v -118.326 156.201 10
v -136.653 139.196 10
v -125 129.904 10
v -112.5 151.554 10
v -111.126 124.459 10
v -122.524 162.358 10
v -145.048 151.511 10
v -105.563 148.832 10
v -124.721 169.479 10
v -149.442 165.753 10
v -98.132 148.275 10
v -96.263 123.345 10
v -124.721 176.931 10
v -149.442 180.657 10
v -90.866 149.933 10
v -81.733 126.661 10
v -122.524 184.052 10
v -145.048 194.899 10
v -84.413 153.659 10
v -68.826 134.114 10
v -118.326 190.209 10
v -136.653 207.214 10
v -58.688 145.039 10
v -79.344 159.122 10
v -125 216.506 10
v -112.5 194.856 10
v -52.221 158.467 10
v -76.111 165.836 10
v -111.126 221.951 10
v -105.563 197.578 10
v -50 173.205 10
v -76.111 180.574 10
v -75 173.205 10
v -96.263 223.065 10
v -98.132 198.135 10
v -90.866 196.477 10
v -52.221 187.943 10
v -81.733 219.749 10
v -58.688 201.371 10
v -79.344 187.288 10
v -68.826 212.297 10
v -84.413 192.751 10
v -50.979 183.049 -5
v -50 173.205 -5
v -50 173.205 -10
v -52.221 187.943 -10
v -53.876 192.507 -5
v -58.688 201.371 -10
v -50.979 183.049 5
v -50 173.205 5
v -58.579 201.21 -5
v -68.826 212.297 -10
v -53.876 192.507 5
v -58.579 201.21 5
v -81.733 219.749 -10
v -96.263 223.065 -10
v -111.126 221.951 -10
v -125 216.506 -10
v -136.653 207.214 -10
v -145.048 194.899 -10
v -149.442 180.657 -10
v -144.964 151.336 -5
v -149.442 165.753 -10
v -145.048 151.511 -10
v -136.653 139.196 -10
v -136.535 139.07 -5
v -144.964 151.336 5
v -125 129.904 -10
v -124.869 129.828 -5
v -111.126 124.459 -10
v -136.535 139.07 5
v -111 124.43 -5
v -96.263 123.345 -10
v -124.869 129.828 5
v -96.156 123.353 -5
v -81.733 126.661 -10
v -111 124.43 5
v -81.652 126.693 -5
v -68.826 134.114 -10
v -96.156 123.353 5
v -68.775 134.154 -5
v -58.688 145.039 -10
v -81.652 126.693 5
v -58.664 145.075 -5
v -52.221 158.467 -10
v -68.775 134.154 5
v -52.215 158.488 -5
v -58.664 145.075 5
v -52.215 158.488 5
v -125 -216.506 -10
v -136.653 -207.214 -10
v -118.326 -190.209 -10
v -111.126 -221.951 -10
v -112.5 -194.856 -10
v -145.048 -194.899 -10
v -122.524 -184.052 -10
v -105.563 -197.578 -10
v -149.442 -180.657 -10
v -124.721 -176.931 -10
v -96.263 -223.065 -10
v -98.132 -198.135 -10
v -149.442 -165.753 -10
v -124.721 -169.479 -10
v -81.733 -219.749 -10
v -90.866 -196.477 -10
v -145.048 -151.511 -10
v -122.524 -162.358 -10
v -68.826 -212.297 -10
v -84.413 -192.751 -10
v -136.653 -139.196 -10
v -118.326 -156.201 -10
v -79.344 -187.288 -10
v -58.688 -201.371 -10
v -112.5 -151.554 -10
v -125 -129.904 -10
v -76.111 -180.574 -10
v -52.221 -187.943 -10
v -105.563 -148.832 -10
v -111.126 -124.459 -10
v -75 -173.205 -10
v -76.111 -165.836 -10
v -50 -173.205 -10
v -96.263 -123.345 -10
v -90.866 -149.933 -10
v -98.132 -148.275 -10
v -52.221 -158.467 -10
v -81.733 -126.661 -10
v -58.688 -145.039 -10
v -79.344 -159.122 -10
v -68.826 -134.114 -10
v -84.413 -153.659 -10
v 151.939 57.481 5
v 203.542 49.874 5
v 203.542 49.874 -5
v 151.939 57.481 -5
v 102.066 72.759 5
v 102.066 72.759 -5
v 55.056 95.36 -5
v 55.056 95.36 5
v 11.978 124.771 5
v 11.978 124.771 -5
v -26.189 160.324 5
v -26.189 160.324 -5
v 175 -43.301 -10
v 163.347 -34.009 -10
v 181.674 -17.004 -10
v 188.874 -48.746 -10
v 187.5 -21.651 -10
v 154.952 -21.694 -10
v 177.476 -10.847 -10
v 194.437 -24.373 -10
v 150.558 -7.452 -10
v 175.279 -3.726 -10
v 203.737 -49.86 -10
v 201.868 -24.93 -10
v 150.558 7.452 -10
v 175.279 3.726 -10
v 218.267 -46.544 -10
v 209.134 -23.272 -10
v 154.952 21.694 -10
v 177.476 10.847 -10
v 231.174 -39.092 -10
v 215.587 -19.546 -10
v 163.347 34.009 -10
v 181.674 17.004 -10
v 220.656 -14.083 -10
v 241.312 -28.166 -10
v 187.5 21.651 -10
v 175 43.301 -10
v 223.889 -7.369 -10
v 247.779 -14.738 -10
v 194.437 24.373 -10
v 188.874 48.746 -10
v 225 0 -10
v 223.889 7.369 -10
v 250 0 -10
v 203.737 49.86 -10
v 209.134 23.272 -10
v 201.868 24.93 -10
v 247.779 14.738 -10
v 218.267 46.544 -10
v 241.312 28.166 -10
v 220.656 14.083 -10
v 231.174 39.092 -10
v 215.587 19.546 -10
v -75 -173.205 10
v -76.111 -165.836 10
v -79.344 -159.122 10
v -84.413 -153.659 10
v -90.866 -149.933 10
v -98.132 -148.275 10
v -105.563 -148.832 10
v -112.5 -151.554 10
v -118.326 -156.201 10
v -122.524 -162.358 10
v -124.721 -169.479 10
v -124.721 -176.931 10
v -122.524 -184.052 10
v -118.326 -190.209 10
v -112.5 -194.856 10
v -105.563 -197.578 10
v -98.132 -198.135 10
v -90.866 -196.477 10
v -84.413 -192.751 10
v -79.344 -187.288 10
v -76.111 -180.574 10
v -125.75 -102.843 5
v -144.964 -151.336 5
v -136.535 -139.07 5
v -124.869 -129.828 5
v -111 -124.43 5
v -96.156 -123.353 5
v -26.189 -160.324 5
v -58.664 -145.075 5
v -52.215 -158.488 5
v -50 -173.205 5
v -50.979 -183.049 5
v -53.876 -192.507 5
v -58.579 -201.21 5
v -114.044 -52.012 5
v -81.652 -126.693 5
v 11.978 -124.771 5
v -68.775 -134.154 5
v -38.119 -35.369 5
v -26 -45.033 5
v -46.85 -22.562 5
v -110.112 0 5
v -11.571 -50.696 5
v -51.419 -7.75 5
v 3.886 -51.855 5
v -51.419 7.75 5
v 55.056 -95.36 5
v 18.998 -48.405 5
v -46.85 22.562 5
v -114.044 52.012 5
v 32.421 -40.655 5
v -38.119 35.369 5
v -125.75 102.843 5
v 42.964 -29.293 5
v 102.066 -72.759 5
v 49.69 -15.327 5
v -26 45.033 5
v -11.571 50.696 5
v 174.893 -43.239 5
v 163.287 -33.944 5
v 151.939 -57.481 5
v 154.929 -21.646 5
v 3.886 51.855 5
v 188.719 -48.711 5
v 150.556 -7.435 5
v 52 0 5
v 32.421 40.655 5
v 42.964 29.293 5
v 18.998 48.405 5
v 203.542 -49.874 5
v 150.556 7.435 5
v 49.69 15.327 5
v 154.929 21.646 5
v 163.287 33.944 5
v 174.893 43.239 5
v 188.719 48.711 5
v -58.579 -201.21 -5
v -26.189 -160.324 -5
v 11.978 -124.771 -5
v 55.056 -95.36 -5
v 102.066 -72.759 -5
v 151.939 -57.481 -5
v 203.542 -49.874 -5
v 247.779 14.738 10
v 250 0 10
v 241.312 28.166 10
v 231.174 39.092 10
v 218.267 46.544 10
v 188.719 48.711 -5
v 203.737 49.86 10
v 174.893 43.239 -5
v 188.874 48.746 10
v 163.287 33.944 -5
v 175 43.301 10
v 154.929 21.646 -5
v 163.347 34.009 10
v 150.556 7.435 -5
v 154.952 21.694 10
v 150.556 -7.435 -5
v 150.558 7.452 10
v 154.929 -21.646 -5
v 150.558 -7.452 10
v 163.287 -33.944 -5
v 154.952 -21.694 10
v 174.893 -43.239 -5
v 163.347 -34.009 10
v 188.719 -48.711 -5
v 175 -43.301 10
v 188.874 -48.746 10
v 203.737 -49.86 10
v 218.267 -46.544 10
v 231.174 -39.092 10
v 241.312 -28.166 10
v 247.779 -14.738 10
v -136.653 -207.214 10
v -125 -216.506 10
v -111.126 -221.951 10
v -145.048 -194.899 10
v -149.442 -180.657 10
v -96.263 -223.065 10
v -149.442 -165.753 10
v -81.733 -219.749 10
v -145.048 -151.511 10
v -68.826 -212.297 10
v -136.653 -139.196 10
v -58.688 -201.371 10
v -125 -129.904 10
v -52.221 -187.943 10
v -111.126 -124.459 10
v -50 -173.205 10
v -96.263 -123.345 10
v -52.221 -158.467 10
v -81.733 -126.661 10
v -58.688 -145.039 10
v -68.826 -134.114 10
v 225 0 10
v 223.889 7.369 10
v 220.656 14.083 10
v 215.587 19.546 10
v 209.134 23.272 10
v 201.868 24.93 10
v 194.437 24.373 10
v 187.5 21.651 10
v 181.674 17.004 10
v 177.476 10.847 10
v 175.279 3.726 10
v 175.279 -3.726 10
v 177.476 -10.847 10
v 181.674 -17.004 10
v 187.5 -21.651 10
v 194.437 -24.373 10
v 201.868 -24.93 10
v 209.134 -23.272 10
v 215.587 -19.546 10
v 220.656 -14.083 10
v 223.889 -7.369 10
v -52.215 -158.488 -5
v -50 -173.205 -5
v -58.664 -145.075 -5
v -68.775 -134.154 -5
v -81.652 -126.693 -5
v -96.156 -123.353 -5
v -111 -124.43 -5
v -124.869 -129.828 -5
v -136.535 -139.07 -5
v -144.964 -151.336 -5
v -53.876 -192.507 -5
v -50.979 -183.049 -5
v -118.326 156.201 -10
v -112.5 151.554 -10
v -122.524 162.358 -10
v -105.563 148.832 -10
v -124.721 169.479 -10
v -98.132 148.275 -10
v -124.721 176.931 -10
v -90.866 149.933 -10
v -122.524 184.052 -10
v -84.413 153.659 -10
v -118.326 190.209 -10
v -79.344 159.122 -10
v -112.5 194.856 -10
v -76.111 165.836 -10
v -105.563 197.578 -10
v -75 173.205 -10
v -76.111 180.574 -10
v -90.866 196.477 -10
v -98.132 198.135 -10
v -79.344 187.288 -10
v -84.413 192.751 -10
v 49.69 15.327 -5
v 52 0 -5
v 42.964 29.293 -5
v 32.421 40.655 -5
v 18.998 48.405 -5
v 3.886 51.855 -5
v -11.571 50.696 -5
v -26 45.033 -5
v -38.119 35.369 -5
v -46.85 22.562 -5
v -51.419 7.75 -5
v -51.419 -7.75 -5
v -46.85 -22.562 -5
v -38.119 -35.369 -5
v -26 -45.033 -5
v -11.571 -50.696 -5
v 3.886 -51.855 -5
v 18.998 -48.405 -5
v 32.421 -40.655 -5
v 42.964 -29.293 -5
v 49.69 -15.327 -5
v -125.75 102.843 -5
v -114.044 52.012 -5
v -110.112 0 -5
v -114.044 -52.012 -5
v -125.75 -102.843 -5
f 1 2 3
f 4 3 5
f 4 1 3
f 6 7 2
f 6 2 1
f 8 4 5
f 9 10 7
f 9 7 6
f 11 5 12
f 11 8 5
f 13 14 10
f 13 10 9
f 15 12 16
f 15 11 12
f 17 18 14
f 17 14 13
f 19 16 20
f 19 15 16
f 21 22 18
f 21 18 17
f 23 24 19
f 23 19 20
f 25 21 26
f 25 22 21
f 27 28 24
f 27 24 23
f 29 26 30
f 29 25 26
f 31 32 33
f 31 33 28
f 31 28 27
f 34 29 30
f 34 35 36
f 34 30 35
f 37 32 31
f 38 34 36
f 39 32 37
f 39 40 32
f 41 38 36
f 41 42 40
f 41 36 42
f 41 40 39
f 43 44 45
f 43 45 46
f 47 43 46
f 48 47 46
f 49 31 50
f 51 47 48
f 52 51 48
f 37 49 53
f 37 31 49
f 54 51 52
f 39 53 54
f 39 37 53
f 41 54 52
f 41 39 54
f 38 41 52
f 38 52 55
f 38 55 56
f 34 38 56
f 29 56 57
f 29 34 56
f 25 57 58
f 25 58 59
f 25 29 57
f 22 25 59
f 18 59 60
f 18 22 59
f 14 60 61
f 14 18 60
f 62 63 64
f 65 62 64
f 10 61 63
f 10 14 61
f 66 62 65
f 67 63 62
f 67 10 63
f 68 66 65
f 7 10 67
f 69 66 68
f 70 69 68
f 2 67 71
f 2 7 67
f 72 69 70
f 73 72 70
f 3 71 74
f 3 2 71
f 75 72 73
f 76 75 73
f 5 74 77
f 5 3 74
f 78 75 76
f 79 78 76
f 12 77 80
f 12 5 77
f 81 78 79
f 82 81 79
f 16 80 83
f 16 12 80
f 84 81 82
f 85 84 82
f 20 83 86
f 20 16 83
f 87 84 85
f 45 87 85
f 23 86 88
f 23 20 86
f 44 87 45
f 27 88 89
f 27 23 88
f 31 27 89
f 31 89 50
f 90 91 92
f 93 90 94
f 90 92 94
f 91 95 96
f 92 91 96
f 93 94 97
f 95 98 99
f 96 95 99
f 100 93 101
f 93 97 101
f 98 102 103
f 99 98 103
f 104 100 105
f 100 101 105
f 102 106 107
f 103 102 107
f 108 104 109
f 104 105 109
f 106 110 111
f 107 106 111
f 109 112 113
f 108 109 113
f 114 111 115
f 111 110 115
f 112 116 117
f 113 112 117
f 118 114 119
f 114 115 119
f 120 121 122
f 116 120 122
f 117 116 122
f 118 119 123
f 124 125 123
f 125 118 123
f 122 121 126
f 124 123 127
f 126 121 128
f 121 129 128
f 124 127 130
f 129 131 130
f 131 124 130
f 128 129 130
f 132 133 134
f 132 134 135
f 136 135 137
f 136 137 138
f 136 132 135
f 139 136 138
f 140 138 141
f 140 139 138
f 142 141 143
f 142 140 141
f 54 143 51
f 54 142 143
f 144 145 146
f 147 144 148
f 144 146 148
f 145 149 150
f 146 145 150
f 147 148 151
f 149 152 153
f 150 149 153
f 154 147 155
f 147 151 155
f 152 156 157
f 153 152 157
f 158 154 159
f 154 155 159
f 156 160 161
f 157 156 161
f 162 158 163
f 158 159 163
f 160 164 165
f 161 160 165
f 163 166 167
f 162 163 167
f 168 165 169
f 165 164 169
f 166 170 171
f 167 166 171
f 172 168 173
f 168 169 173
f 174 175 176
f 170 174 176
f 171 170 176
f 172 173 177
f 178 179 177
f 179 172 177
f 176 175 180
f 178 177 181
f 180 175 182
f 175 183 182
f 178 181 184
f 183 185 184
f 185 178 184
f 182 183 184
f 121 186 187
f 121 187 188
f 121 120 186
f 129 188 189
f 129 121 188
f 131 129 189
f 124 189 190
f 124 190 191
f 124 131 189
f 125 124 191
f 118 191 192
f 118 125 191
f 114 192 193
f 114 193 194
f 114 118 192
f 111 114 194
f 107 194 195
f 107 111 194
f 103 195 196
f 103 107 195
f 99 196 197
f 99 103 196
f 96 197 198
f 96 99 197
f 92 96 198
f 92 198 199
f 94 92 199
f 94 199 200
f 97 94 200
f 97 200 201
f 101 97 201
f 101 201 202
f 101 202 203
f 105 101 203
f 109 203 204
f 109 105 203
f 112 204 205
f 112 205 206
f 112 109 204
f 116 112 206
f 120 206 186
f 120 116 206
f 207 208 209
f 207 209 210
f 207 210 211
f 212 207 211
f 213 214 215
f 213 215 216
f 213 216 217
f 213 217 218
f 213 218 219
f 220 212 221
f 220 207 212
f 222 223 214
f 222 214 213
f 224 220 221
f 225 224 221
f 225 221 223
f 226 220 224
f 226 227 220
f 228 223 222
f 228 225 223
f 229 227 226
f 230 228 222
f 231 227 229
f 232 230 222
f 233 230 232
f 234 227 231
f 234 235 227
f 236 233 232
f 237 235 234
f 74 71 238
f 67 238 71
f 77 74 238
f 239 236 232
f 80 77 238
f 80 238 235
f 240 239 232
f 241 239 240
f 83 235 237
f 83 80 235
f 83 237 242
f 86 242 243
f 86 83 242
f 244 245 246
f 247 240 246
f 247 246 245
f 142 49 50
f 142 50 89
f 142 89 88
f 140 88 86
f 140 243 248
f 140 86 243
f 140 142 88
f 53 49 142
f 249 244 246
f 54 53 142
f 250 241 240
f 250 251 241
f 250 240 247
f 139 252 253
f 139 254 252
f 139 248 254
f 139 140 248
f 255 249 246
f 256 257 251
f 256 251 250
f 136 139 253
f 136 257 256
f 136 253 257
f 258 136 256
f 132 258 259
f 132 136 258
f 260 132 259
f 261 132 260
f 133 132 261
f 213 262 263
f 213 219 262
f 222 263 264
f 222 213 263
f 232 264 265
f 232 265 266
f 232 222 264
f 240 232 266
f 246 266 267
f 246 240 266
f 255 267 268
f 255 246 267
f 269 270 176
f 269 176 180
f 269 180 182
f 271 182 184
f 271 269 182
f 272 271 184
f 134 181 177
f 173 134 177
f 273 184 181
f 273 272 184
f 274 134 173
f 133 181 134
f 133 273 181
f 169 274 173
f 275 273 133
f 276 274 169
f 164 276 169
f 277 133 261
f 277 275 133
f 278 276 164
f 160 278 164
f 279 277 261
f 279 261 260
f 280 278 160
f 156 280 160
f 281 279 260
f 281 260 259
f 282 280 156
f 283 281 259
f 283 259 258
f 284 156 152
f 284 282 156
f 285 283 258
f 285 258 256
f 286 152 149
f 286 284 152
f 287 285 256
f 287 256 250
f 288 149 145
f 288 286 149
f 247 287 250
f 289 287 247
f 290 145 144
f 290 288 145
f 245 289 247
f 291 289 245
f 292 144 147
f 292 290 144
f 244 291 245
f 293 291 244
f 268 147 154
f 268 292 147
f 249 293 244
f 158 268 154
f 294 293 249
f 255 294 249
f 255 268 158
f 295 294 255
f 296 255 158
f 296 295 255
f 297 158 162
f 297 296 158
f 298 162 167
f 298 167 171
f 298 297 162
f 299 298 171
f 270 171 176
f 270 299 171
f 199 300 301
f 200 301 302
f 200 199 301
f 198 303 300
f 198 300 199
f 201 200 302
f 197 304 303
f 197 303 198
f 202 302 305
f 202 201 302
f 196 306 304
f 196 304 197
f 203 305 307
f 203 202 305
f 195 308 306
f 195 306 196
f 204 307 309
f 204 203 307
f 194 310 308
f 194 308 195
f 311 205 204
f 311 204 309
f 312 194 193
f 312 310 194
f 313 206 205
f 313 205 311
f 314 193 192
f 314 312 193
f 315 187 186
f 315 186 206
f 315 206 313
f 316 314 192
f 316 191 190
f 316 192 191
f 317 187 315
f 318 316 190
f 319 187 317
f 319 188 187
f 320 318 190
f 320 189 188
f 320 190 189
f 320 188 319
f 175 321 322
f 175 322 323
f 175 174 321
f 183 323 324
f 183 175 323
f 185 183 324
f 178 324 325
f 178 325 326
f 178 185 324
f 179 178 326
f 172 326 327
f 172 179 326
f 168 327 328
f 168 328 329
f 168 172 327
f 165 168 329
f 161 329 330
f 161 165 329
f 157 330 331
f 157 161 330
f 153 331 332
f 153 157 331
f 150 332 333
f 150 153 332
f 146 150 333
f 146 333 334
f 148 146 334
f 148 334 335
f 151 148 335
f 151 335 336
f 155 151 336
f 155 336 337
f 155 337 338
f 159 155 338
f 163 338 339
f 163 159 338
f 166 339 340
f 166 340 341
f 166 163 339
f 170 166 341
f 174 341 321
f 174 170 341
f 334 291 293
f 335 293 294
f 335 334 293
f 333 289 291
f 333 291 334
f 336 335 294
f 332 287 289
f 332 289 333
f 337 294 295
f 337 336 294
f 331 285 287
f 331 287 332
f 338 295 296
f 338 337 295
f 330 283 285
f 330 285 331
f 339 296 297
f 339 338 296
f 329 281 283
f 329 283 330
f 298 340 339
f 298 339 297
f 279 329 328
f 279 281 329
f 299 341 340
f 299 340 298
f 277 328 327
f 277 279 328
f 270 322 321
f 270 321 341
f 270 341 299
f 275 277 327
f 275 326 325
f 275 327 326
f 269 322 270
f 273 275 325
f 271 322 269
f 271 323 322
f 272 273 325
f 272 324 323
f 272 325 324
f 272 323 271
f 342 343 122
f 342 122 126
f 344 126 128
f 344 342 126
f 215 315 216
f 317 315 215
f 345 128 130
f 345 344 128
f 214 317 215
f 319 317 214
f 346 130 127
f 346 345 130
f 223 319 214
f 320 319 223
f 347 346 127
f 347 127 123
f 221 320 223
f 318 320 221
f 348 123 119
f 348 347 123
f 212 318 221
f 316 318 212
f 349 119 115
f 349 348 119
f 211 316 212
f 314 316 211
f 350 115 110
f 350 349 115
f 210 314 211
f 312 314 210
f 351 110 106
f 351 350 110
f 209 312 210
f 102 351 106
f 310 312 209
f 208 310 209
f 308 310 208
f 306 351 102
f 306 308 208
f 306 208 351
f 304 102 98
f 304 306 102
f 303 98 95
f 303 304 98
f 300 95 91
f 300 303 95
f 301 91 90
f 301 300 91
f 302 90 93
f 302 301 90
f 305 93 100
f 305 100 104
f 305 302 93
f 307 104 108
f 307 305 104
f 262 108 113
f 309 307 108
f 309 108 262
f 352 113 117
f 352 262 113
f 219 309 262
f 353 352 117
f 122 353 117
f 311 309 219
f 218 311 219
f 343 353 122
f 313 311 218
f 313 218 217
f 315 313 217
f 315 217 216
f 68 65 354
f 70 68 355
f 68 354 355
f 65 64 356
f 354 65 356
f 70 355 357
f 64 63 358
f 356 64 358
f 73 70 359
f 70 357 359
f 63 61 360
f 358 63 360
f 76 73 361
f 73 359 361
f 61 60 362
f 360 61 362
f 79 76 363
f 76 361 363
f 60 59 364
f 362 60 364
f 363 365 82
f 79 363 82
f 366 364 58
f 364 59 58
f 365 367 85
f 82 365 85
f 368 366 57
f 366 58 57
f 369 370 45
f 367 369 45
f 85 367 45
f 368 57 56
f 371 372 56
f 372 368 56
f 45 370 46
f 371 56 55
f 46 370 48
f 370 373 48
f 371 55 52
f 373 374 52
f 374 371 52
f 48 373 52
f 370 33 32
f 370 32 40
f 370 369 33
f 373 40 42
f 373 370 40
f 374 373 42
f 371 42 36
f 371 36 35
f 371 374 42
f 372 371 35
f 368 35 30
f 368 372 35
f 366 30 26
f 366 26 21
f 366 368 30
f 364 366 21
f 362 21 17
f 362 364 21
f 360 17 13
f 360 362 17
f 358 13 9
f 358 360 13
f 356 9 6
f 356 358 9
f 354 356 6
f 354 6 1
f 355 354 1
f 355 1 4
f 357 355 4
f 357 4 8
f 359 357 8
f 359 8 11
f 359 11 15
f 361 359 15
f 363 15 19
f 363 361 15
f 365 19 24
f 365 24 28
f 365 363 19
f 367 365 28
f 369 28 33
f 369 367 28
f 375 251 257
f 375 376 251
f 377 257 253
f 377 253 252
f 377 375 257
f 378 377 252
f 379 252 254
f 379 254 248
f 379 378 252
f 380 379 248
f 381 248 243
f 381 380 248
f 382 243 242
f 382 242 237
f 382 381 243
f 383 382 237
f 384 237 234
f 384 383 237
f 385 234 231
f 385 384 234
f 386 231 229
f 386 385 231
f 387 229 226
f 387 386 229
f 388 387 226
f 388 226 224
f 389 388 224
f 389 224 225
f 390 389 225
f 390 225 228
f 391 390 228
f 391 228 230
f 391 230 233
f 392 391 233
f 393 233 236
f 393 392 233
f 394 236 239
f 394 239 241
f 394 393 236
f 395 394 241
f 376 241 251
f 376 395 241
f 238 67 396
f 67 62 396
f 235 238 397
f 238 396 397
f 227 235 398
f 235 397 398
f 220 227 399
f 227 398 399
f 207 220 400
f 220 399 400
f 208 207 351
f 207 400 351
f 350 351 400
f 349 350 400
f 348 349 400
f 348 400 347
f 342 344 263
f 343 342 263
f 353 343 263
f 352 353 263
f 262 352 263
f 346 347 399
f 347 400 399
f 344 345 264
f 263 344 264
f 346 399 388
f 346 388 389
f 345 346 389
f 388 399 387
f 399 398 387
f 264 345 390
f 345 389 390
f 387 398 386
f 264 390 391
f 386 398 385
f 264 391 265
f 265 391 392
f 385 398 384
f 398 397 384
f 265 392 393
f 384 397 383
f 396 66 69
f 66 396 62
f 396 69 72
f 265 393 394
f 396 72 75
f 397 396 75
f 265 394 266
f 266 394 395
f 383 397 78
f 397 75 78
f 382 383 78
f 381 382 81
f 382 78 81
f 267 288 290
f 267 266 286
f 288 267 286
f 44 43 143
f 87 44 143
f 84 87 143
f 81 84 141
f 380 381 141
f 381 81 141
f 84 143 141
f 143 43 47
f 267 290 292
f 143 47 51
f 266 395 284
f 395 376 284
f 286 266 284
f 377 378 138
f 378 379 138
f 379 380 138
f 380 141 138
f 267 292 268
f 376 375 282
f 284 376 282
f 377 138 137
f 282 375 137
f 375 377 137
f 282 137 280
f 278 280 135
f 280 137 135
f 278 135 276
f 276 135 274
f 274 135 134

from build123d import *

# Parameters (mm, degrees)
SKETCH1_R             = 50
SKETCH1_R_2           = 25
BOSS_EXTRUDE1_DEPTH   = 10
BOSS_EXTRUDE1_2_DEPTH = 10
BOSS_EXTRUDE1_3_DEPTH = 10
SKETCH1_3_R           = 52
BOSS_EXTRUDE2_DEPTH   = 5


with BuildPart() as part:
    # Sketch1 → Boss-Extrude1 (new, symmetric)
    with BuildSketch(Plane.XY):
        with Locations((-100, 173.205080757)):
            Circle(SKETCH1_R)
        with Locations((-100, 173.205080757)):
            Circle(SKETCH1_R_2, mode=Mode.SUBTRACT)
    extrude(amount=BOSS_EXTRUDE1_DEPTH, both=True)



with BuildPart() as body_2:
    # Sketch1 → Boss-Extrude1 2 (new, symmetric)
    with BuildSketch(Plane.XY):
        with Locations((-100, -173.205080757)):
            Circle(SKETCH1_R)
        with Locations((-100, -173.205080757)):
            Circle(SKETCH1_R_2, mode=Mode.SUBTRACT)
    extrude(amount=BOSS_EXTRUDE1_2_DEPTH, both=True)


with BuildPart() as body_3:
    # Sketch1 → Boss-Extrude1 3 (new, symmetric)
    with BuildSketch(Plane.XY):
        with Locations((200, 0)):
            Circle(SKETCH1_R)
        with Locations((200, 0)):
            Circle(SKETCH1_R_2, mode=Mode.SUBTRACT)
    extrude(amount=BOSS_EXTRUDE1_3_DEPTH, both=True)


with BuildPart() as part_1:
    add(part.part)

    add(body_2.part)  # Boss-Extrude2 merges body 2

    add(body_3.part)  # Boss-Extrude2 merges body 3
    # Sketch1<3> → Boss-Extrude2 (add, symmetric)
    with BuildSketch(Plane.XY):
        with BuildLine():
            ThreePointArc((203.542445822, -49.874352904), (150, 0), (203.542445822, 49.874352904))
            ThreePointArc((203.542445822, 49.874352904), (55.056170912, 95.360085291), (-58.578766299, 201.210105283))
            ThreePointArc((-58.578766299, 201.210105283), (-52.19277416, 187.849846288), (-50, 173.205080757))
            ThreePointArc((-50, 173.205080757), (-88.779126063, 124.480425929), (-144.963679523, 151.335752378))
            ThreePointArc((-144.963679523, 151.335752378), (-110.112341825, 0), (-144.963679523, -151.335752378))
            ThreePointArc((-144.963679523, -151.335752378), (-88.779126063, -124.480425929), (-50, -173.205080757))
            ThreePointArc((-50, -173.205080757), (-52.19277416, -187.849846288), (-58.578766299, -201.210105283))
            ThreePointArc((-58.578766299, -201.210105283), (55.056170912, -95.360085291), (203.542445822, -49.874352904))
        make_face()
        Circle(SKETCH1_3_R, mode=Mode.SUBTRACT)
    extrude(amount=BOSS_EXTRUDE2_DEPTH, both=True)


solid = part_1.part
